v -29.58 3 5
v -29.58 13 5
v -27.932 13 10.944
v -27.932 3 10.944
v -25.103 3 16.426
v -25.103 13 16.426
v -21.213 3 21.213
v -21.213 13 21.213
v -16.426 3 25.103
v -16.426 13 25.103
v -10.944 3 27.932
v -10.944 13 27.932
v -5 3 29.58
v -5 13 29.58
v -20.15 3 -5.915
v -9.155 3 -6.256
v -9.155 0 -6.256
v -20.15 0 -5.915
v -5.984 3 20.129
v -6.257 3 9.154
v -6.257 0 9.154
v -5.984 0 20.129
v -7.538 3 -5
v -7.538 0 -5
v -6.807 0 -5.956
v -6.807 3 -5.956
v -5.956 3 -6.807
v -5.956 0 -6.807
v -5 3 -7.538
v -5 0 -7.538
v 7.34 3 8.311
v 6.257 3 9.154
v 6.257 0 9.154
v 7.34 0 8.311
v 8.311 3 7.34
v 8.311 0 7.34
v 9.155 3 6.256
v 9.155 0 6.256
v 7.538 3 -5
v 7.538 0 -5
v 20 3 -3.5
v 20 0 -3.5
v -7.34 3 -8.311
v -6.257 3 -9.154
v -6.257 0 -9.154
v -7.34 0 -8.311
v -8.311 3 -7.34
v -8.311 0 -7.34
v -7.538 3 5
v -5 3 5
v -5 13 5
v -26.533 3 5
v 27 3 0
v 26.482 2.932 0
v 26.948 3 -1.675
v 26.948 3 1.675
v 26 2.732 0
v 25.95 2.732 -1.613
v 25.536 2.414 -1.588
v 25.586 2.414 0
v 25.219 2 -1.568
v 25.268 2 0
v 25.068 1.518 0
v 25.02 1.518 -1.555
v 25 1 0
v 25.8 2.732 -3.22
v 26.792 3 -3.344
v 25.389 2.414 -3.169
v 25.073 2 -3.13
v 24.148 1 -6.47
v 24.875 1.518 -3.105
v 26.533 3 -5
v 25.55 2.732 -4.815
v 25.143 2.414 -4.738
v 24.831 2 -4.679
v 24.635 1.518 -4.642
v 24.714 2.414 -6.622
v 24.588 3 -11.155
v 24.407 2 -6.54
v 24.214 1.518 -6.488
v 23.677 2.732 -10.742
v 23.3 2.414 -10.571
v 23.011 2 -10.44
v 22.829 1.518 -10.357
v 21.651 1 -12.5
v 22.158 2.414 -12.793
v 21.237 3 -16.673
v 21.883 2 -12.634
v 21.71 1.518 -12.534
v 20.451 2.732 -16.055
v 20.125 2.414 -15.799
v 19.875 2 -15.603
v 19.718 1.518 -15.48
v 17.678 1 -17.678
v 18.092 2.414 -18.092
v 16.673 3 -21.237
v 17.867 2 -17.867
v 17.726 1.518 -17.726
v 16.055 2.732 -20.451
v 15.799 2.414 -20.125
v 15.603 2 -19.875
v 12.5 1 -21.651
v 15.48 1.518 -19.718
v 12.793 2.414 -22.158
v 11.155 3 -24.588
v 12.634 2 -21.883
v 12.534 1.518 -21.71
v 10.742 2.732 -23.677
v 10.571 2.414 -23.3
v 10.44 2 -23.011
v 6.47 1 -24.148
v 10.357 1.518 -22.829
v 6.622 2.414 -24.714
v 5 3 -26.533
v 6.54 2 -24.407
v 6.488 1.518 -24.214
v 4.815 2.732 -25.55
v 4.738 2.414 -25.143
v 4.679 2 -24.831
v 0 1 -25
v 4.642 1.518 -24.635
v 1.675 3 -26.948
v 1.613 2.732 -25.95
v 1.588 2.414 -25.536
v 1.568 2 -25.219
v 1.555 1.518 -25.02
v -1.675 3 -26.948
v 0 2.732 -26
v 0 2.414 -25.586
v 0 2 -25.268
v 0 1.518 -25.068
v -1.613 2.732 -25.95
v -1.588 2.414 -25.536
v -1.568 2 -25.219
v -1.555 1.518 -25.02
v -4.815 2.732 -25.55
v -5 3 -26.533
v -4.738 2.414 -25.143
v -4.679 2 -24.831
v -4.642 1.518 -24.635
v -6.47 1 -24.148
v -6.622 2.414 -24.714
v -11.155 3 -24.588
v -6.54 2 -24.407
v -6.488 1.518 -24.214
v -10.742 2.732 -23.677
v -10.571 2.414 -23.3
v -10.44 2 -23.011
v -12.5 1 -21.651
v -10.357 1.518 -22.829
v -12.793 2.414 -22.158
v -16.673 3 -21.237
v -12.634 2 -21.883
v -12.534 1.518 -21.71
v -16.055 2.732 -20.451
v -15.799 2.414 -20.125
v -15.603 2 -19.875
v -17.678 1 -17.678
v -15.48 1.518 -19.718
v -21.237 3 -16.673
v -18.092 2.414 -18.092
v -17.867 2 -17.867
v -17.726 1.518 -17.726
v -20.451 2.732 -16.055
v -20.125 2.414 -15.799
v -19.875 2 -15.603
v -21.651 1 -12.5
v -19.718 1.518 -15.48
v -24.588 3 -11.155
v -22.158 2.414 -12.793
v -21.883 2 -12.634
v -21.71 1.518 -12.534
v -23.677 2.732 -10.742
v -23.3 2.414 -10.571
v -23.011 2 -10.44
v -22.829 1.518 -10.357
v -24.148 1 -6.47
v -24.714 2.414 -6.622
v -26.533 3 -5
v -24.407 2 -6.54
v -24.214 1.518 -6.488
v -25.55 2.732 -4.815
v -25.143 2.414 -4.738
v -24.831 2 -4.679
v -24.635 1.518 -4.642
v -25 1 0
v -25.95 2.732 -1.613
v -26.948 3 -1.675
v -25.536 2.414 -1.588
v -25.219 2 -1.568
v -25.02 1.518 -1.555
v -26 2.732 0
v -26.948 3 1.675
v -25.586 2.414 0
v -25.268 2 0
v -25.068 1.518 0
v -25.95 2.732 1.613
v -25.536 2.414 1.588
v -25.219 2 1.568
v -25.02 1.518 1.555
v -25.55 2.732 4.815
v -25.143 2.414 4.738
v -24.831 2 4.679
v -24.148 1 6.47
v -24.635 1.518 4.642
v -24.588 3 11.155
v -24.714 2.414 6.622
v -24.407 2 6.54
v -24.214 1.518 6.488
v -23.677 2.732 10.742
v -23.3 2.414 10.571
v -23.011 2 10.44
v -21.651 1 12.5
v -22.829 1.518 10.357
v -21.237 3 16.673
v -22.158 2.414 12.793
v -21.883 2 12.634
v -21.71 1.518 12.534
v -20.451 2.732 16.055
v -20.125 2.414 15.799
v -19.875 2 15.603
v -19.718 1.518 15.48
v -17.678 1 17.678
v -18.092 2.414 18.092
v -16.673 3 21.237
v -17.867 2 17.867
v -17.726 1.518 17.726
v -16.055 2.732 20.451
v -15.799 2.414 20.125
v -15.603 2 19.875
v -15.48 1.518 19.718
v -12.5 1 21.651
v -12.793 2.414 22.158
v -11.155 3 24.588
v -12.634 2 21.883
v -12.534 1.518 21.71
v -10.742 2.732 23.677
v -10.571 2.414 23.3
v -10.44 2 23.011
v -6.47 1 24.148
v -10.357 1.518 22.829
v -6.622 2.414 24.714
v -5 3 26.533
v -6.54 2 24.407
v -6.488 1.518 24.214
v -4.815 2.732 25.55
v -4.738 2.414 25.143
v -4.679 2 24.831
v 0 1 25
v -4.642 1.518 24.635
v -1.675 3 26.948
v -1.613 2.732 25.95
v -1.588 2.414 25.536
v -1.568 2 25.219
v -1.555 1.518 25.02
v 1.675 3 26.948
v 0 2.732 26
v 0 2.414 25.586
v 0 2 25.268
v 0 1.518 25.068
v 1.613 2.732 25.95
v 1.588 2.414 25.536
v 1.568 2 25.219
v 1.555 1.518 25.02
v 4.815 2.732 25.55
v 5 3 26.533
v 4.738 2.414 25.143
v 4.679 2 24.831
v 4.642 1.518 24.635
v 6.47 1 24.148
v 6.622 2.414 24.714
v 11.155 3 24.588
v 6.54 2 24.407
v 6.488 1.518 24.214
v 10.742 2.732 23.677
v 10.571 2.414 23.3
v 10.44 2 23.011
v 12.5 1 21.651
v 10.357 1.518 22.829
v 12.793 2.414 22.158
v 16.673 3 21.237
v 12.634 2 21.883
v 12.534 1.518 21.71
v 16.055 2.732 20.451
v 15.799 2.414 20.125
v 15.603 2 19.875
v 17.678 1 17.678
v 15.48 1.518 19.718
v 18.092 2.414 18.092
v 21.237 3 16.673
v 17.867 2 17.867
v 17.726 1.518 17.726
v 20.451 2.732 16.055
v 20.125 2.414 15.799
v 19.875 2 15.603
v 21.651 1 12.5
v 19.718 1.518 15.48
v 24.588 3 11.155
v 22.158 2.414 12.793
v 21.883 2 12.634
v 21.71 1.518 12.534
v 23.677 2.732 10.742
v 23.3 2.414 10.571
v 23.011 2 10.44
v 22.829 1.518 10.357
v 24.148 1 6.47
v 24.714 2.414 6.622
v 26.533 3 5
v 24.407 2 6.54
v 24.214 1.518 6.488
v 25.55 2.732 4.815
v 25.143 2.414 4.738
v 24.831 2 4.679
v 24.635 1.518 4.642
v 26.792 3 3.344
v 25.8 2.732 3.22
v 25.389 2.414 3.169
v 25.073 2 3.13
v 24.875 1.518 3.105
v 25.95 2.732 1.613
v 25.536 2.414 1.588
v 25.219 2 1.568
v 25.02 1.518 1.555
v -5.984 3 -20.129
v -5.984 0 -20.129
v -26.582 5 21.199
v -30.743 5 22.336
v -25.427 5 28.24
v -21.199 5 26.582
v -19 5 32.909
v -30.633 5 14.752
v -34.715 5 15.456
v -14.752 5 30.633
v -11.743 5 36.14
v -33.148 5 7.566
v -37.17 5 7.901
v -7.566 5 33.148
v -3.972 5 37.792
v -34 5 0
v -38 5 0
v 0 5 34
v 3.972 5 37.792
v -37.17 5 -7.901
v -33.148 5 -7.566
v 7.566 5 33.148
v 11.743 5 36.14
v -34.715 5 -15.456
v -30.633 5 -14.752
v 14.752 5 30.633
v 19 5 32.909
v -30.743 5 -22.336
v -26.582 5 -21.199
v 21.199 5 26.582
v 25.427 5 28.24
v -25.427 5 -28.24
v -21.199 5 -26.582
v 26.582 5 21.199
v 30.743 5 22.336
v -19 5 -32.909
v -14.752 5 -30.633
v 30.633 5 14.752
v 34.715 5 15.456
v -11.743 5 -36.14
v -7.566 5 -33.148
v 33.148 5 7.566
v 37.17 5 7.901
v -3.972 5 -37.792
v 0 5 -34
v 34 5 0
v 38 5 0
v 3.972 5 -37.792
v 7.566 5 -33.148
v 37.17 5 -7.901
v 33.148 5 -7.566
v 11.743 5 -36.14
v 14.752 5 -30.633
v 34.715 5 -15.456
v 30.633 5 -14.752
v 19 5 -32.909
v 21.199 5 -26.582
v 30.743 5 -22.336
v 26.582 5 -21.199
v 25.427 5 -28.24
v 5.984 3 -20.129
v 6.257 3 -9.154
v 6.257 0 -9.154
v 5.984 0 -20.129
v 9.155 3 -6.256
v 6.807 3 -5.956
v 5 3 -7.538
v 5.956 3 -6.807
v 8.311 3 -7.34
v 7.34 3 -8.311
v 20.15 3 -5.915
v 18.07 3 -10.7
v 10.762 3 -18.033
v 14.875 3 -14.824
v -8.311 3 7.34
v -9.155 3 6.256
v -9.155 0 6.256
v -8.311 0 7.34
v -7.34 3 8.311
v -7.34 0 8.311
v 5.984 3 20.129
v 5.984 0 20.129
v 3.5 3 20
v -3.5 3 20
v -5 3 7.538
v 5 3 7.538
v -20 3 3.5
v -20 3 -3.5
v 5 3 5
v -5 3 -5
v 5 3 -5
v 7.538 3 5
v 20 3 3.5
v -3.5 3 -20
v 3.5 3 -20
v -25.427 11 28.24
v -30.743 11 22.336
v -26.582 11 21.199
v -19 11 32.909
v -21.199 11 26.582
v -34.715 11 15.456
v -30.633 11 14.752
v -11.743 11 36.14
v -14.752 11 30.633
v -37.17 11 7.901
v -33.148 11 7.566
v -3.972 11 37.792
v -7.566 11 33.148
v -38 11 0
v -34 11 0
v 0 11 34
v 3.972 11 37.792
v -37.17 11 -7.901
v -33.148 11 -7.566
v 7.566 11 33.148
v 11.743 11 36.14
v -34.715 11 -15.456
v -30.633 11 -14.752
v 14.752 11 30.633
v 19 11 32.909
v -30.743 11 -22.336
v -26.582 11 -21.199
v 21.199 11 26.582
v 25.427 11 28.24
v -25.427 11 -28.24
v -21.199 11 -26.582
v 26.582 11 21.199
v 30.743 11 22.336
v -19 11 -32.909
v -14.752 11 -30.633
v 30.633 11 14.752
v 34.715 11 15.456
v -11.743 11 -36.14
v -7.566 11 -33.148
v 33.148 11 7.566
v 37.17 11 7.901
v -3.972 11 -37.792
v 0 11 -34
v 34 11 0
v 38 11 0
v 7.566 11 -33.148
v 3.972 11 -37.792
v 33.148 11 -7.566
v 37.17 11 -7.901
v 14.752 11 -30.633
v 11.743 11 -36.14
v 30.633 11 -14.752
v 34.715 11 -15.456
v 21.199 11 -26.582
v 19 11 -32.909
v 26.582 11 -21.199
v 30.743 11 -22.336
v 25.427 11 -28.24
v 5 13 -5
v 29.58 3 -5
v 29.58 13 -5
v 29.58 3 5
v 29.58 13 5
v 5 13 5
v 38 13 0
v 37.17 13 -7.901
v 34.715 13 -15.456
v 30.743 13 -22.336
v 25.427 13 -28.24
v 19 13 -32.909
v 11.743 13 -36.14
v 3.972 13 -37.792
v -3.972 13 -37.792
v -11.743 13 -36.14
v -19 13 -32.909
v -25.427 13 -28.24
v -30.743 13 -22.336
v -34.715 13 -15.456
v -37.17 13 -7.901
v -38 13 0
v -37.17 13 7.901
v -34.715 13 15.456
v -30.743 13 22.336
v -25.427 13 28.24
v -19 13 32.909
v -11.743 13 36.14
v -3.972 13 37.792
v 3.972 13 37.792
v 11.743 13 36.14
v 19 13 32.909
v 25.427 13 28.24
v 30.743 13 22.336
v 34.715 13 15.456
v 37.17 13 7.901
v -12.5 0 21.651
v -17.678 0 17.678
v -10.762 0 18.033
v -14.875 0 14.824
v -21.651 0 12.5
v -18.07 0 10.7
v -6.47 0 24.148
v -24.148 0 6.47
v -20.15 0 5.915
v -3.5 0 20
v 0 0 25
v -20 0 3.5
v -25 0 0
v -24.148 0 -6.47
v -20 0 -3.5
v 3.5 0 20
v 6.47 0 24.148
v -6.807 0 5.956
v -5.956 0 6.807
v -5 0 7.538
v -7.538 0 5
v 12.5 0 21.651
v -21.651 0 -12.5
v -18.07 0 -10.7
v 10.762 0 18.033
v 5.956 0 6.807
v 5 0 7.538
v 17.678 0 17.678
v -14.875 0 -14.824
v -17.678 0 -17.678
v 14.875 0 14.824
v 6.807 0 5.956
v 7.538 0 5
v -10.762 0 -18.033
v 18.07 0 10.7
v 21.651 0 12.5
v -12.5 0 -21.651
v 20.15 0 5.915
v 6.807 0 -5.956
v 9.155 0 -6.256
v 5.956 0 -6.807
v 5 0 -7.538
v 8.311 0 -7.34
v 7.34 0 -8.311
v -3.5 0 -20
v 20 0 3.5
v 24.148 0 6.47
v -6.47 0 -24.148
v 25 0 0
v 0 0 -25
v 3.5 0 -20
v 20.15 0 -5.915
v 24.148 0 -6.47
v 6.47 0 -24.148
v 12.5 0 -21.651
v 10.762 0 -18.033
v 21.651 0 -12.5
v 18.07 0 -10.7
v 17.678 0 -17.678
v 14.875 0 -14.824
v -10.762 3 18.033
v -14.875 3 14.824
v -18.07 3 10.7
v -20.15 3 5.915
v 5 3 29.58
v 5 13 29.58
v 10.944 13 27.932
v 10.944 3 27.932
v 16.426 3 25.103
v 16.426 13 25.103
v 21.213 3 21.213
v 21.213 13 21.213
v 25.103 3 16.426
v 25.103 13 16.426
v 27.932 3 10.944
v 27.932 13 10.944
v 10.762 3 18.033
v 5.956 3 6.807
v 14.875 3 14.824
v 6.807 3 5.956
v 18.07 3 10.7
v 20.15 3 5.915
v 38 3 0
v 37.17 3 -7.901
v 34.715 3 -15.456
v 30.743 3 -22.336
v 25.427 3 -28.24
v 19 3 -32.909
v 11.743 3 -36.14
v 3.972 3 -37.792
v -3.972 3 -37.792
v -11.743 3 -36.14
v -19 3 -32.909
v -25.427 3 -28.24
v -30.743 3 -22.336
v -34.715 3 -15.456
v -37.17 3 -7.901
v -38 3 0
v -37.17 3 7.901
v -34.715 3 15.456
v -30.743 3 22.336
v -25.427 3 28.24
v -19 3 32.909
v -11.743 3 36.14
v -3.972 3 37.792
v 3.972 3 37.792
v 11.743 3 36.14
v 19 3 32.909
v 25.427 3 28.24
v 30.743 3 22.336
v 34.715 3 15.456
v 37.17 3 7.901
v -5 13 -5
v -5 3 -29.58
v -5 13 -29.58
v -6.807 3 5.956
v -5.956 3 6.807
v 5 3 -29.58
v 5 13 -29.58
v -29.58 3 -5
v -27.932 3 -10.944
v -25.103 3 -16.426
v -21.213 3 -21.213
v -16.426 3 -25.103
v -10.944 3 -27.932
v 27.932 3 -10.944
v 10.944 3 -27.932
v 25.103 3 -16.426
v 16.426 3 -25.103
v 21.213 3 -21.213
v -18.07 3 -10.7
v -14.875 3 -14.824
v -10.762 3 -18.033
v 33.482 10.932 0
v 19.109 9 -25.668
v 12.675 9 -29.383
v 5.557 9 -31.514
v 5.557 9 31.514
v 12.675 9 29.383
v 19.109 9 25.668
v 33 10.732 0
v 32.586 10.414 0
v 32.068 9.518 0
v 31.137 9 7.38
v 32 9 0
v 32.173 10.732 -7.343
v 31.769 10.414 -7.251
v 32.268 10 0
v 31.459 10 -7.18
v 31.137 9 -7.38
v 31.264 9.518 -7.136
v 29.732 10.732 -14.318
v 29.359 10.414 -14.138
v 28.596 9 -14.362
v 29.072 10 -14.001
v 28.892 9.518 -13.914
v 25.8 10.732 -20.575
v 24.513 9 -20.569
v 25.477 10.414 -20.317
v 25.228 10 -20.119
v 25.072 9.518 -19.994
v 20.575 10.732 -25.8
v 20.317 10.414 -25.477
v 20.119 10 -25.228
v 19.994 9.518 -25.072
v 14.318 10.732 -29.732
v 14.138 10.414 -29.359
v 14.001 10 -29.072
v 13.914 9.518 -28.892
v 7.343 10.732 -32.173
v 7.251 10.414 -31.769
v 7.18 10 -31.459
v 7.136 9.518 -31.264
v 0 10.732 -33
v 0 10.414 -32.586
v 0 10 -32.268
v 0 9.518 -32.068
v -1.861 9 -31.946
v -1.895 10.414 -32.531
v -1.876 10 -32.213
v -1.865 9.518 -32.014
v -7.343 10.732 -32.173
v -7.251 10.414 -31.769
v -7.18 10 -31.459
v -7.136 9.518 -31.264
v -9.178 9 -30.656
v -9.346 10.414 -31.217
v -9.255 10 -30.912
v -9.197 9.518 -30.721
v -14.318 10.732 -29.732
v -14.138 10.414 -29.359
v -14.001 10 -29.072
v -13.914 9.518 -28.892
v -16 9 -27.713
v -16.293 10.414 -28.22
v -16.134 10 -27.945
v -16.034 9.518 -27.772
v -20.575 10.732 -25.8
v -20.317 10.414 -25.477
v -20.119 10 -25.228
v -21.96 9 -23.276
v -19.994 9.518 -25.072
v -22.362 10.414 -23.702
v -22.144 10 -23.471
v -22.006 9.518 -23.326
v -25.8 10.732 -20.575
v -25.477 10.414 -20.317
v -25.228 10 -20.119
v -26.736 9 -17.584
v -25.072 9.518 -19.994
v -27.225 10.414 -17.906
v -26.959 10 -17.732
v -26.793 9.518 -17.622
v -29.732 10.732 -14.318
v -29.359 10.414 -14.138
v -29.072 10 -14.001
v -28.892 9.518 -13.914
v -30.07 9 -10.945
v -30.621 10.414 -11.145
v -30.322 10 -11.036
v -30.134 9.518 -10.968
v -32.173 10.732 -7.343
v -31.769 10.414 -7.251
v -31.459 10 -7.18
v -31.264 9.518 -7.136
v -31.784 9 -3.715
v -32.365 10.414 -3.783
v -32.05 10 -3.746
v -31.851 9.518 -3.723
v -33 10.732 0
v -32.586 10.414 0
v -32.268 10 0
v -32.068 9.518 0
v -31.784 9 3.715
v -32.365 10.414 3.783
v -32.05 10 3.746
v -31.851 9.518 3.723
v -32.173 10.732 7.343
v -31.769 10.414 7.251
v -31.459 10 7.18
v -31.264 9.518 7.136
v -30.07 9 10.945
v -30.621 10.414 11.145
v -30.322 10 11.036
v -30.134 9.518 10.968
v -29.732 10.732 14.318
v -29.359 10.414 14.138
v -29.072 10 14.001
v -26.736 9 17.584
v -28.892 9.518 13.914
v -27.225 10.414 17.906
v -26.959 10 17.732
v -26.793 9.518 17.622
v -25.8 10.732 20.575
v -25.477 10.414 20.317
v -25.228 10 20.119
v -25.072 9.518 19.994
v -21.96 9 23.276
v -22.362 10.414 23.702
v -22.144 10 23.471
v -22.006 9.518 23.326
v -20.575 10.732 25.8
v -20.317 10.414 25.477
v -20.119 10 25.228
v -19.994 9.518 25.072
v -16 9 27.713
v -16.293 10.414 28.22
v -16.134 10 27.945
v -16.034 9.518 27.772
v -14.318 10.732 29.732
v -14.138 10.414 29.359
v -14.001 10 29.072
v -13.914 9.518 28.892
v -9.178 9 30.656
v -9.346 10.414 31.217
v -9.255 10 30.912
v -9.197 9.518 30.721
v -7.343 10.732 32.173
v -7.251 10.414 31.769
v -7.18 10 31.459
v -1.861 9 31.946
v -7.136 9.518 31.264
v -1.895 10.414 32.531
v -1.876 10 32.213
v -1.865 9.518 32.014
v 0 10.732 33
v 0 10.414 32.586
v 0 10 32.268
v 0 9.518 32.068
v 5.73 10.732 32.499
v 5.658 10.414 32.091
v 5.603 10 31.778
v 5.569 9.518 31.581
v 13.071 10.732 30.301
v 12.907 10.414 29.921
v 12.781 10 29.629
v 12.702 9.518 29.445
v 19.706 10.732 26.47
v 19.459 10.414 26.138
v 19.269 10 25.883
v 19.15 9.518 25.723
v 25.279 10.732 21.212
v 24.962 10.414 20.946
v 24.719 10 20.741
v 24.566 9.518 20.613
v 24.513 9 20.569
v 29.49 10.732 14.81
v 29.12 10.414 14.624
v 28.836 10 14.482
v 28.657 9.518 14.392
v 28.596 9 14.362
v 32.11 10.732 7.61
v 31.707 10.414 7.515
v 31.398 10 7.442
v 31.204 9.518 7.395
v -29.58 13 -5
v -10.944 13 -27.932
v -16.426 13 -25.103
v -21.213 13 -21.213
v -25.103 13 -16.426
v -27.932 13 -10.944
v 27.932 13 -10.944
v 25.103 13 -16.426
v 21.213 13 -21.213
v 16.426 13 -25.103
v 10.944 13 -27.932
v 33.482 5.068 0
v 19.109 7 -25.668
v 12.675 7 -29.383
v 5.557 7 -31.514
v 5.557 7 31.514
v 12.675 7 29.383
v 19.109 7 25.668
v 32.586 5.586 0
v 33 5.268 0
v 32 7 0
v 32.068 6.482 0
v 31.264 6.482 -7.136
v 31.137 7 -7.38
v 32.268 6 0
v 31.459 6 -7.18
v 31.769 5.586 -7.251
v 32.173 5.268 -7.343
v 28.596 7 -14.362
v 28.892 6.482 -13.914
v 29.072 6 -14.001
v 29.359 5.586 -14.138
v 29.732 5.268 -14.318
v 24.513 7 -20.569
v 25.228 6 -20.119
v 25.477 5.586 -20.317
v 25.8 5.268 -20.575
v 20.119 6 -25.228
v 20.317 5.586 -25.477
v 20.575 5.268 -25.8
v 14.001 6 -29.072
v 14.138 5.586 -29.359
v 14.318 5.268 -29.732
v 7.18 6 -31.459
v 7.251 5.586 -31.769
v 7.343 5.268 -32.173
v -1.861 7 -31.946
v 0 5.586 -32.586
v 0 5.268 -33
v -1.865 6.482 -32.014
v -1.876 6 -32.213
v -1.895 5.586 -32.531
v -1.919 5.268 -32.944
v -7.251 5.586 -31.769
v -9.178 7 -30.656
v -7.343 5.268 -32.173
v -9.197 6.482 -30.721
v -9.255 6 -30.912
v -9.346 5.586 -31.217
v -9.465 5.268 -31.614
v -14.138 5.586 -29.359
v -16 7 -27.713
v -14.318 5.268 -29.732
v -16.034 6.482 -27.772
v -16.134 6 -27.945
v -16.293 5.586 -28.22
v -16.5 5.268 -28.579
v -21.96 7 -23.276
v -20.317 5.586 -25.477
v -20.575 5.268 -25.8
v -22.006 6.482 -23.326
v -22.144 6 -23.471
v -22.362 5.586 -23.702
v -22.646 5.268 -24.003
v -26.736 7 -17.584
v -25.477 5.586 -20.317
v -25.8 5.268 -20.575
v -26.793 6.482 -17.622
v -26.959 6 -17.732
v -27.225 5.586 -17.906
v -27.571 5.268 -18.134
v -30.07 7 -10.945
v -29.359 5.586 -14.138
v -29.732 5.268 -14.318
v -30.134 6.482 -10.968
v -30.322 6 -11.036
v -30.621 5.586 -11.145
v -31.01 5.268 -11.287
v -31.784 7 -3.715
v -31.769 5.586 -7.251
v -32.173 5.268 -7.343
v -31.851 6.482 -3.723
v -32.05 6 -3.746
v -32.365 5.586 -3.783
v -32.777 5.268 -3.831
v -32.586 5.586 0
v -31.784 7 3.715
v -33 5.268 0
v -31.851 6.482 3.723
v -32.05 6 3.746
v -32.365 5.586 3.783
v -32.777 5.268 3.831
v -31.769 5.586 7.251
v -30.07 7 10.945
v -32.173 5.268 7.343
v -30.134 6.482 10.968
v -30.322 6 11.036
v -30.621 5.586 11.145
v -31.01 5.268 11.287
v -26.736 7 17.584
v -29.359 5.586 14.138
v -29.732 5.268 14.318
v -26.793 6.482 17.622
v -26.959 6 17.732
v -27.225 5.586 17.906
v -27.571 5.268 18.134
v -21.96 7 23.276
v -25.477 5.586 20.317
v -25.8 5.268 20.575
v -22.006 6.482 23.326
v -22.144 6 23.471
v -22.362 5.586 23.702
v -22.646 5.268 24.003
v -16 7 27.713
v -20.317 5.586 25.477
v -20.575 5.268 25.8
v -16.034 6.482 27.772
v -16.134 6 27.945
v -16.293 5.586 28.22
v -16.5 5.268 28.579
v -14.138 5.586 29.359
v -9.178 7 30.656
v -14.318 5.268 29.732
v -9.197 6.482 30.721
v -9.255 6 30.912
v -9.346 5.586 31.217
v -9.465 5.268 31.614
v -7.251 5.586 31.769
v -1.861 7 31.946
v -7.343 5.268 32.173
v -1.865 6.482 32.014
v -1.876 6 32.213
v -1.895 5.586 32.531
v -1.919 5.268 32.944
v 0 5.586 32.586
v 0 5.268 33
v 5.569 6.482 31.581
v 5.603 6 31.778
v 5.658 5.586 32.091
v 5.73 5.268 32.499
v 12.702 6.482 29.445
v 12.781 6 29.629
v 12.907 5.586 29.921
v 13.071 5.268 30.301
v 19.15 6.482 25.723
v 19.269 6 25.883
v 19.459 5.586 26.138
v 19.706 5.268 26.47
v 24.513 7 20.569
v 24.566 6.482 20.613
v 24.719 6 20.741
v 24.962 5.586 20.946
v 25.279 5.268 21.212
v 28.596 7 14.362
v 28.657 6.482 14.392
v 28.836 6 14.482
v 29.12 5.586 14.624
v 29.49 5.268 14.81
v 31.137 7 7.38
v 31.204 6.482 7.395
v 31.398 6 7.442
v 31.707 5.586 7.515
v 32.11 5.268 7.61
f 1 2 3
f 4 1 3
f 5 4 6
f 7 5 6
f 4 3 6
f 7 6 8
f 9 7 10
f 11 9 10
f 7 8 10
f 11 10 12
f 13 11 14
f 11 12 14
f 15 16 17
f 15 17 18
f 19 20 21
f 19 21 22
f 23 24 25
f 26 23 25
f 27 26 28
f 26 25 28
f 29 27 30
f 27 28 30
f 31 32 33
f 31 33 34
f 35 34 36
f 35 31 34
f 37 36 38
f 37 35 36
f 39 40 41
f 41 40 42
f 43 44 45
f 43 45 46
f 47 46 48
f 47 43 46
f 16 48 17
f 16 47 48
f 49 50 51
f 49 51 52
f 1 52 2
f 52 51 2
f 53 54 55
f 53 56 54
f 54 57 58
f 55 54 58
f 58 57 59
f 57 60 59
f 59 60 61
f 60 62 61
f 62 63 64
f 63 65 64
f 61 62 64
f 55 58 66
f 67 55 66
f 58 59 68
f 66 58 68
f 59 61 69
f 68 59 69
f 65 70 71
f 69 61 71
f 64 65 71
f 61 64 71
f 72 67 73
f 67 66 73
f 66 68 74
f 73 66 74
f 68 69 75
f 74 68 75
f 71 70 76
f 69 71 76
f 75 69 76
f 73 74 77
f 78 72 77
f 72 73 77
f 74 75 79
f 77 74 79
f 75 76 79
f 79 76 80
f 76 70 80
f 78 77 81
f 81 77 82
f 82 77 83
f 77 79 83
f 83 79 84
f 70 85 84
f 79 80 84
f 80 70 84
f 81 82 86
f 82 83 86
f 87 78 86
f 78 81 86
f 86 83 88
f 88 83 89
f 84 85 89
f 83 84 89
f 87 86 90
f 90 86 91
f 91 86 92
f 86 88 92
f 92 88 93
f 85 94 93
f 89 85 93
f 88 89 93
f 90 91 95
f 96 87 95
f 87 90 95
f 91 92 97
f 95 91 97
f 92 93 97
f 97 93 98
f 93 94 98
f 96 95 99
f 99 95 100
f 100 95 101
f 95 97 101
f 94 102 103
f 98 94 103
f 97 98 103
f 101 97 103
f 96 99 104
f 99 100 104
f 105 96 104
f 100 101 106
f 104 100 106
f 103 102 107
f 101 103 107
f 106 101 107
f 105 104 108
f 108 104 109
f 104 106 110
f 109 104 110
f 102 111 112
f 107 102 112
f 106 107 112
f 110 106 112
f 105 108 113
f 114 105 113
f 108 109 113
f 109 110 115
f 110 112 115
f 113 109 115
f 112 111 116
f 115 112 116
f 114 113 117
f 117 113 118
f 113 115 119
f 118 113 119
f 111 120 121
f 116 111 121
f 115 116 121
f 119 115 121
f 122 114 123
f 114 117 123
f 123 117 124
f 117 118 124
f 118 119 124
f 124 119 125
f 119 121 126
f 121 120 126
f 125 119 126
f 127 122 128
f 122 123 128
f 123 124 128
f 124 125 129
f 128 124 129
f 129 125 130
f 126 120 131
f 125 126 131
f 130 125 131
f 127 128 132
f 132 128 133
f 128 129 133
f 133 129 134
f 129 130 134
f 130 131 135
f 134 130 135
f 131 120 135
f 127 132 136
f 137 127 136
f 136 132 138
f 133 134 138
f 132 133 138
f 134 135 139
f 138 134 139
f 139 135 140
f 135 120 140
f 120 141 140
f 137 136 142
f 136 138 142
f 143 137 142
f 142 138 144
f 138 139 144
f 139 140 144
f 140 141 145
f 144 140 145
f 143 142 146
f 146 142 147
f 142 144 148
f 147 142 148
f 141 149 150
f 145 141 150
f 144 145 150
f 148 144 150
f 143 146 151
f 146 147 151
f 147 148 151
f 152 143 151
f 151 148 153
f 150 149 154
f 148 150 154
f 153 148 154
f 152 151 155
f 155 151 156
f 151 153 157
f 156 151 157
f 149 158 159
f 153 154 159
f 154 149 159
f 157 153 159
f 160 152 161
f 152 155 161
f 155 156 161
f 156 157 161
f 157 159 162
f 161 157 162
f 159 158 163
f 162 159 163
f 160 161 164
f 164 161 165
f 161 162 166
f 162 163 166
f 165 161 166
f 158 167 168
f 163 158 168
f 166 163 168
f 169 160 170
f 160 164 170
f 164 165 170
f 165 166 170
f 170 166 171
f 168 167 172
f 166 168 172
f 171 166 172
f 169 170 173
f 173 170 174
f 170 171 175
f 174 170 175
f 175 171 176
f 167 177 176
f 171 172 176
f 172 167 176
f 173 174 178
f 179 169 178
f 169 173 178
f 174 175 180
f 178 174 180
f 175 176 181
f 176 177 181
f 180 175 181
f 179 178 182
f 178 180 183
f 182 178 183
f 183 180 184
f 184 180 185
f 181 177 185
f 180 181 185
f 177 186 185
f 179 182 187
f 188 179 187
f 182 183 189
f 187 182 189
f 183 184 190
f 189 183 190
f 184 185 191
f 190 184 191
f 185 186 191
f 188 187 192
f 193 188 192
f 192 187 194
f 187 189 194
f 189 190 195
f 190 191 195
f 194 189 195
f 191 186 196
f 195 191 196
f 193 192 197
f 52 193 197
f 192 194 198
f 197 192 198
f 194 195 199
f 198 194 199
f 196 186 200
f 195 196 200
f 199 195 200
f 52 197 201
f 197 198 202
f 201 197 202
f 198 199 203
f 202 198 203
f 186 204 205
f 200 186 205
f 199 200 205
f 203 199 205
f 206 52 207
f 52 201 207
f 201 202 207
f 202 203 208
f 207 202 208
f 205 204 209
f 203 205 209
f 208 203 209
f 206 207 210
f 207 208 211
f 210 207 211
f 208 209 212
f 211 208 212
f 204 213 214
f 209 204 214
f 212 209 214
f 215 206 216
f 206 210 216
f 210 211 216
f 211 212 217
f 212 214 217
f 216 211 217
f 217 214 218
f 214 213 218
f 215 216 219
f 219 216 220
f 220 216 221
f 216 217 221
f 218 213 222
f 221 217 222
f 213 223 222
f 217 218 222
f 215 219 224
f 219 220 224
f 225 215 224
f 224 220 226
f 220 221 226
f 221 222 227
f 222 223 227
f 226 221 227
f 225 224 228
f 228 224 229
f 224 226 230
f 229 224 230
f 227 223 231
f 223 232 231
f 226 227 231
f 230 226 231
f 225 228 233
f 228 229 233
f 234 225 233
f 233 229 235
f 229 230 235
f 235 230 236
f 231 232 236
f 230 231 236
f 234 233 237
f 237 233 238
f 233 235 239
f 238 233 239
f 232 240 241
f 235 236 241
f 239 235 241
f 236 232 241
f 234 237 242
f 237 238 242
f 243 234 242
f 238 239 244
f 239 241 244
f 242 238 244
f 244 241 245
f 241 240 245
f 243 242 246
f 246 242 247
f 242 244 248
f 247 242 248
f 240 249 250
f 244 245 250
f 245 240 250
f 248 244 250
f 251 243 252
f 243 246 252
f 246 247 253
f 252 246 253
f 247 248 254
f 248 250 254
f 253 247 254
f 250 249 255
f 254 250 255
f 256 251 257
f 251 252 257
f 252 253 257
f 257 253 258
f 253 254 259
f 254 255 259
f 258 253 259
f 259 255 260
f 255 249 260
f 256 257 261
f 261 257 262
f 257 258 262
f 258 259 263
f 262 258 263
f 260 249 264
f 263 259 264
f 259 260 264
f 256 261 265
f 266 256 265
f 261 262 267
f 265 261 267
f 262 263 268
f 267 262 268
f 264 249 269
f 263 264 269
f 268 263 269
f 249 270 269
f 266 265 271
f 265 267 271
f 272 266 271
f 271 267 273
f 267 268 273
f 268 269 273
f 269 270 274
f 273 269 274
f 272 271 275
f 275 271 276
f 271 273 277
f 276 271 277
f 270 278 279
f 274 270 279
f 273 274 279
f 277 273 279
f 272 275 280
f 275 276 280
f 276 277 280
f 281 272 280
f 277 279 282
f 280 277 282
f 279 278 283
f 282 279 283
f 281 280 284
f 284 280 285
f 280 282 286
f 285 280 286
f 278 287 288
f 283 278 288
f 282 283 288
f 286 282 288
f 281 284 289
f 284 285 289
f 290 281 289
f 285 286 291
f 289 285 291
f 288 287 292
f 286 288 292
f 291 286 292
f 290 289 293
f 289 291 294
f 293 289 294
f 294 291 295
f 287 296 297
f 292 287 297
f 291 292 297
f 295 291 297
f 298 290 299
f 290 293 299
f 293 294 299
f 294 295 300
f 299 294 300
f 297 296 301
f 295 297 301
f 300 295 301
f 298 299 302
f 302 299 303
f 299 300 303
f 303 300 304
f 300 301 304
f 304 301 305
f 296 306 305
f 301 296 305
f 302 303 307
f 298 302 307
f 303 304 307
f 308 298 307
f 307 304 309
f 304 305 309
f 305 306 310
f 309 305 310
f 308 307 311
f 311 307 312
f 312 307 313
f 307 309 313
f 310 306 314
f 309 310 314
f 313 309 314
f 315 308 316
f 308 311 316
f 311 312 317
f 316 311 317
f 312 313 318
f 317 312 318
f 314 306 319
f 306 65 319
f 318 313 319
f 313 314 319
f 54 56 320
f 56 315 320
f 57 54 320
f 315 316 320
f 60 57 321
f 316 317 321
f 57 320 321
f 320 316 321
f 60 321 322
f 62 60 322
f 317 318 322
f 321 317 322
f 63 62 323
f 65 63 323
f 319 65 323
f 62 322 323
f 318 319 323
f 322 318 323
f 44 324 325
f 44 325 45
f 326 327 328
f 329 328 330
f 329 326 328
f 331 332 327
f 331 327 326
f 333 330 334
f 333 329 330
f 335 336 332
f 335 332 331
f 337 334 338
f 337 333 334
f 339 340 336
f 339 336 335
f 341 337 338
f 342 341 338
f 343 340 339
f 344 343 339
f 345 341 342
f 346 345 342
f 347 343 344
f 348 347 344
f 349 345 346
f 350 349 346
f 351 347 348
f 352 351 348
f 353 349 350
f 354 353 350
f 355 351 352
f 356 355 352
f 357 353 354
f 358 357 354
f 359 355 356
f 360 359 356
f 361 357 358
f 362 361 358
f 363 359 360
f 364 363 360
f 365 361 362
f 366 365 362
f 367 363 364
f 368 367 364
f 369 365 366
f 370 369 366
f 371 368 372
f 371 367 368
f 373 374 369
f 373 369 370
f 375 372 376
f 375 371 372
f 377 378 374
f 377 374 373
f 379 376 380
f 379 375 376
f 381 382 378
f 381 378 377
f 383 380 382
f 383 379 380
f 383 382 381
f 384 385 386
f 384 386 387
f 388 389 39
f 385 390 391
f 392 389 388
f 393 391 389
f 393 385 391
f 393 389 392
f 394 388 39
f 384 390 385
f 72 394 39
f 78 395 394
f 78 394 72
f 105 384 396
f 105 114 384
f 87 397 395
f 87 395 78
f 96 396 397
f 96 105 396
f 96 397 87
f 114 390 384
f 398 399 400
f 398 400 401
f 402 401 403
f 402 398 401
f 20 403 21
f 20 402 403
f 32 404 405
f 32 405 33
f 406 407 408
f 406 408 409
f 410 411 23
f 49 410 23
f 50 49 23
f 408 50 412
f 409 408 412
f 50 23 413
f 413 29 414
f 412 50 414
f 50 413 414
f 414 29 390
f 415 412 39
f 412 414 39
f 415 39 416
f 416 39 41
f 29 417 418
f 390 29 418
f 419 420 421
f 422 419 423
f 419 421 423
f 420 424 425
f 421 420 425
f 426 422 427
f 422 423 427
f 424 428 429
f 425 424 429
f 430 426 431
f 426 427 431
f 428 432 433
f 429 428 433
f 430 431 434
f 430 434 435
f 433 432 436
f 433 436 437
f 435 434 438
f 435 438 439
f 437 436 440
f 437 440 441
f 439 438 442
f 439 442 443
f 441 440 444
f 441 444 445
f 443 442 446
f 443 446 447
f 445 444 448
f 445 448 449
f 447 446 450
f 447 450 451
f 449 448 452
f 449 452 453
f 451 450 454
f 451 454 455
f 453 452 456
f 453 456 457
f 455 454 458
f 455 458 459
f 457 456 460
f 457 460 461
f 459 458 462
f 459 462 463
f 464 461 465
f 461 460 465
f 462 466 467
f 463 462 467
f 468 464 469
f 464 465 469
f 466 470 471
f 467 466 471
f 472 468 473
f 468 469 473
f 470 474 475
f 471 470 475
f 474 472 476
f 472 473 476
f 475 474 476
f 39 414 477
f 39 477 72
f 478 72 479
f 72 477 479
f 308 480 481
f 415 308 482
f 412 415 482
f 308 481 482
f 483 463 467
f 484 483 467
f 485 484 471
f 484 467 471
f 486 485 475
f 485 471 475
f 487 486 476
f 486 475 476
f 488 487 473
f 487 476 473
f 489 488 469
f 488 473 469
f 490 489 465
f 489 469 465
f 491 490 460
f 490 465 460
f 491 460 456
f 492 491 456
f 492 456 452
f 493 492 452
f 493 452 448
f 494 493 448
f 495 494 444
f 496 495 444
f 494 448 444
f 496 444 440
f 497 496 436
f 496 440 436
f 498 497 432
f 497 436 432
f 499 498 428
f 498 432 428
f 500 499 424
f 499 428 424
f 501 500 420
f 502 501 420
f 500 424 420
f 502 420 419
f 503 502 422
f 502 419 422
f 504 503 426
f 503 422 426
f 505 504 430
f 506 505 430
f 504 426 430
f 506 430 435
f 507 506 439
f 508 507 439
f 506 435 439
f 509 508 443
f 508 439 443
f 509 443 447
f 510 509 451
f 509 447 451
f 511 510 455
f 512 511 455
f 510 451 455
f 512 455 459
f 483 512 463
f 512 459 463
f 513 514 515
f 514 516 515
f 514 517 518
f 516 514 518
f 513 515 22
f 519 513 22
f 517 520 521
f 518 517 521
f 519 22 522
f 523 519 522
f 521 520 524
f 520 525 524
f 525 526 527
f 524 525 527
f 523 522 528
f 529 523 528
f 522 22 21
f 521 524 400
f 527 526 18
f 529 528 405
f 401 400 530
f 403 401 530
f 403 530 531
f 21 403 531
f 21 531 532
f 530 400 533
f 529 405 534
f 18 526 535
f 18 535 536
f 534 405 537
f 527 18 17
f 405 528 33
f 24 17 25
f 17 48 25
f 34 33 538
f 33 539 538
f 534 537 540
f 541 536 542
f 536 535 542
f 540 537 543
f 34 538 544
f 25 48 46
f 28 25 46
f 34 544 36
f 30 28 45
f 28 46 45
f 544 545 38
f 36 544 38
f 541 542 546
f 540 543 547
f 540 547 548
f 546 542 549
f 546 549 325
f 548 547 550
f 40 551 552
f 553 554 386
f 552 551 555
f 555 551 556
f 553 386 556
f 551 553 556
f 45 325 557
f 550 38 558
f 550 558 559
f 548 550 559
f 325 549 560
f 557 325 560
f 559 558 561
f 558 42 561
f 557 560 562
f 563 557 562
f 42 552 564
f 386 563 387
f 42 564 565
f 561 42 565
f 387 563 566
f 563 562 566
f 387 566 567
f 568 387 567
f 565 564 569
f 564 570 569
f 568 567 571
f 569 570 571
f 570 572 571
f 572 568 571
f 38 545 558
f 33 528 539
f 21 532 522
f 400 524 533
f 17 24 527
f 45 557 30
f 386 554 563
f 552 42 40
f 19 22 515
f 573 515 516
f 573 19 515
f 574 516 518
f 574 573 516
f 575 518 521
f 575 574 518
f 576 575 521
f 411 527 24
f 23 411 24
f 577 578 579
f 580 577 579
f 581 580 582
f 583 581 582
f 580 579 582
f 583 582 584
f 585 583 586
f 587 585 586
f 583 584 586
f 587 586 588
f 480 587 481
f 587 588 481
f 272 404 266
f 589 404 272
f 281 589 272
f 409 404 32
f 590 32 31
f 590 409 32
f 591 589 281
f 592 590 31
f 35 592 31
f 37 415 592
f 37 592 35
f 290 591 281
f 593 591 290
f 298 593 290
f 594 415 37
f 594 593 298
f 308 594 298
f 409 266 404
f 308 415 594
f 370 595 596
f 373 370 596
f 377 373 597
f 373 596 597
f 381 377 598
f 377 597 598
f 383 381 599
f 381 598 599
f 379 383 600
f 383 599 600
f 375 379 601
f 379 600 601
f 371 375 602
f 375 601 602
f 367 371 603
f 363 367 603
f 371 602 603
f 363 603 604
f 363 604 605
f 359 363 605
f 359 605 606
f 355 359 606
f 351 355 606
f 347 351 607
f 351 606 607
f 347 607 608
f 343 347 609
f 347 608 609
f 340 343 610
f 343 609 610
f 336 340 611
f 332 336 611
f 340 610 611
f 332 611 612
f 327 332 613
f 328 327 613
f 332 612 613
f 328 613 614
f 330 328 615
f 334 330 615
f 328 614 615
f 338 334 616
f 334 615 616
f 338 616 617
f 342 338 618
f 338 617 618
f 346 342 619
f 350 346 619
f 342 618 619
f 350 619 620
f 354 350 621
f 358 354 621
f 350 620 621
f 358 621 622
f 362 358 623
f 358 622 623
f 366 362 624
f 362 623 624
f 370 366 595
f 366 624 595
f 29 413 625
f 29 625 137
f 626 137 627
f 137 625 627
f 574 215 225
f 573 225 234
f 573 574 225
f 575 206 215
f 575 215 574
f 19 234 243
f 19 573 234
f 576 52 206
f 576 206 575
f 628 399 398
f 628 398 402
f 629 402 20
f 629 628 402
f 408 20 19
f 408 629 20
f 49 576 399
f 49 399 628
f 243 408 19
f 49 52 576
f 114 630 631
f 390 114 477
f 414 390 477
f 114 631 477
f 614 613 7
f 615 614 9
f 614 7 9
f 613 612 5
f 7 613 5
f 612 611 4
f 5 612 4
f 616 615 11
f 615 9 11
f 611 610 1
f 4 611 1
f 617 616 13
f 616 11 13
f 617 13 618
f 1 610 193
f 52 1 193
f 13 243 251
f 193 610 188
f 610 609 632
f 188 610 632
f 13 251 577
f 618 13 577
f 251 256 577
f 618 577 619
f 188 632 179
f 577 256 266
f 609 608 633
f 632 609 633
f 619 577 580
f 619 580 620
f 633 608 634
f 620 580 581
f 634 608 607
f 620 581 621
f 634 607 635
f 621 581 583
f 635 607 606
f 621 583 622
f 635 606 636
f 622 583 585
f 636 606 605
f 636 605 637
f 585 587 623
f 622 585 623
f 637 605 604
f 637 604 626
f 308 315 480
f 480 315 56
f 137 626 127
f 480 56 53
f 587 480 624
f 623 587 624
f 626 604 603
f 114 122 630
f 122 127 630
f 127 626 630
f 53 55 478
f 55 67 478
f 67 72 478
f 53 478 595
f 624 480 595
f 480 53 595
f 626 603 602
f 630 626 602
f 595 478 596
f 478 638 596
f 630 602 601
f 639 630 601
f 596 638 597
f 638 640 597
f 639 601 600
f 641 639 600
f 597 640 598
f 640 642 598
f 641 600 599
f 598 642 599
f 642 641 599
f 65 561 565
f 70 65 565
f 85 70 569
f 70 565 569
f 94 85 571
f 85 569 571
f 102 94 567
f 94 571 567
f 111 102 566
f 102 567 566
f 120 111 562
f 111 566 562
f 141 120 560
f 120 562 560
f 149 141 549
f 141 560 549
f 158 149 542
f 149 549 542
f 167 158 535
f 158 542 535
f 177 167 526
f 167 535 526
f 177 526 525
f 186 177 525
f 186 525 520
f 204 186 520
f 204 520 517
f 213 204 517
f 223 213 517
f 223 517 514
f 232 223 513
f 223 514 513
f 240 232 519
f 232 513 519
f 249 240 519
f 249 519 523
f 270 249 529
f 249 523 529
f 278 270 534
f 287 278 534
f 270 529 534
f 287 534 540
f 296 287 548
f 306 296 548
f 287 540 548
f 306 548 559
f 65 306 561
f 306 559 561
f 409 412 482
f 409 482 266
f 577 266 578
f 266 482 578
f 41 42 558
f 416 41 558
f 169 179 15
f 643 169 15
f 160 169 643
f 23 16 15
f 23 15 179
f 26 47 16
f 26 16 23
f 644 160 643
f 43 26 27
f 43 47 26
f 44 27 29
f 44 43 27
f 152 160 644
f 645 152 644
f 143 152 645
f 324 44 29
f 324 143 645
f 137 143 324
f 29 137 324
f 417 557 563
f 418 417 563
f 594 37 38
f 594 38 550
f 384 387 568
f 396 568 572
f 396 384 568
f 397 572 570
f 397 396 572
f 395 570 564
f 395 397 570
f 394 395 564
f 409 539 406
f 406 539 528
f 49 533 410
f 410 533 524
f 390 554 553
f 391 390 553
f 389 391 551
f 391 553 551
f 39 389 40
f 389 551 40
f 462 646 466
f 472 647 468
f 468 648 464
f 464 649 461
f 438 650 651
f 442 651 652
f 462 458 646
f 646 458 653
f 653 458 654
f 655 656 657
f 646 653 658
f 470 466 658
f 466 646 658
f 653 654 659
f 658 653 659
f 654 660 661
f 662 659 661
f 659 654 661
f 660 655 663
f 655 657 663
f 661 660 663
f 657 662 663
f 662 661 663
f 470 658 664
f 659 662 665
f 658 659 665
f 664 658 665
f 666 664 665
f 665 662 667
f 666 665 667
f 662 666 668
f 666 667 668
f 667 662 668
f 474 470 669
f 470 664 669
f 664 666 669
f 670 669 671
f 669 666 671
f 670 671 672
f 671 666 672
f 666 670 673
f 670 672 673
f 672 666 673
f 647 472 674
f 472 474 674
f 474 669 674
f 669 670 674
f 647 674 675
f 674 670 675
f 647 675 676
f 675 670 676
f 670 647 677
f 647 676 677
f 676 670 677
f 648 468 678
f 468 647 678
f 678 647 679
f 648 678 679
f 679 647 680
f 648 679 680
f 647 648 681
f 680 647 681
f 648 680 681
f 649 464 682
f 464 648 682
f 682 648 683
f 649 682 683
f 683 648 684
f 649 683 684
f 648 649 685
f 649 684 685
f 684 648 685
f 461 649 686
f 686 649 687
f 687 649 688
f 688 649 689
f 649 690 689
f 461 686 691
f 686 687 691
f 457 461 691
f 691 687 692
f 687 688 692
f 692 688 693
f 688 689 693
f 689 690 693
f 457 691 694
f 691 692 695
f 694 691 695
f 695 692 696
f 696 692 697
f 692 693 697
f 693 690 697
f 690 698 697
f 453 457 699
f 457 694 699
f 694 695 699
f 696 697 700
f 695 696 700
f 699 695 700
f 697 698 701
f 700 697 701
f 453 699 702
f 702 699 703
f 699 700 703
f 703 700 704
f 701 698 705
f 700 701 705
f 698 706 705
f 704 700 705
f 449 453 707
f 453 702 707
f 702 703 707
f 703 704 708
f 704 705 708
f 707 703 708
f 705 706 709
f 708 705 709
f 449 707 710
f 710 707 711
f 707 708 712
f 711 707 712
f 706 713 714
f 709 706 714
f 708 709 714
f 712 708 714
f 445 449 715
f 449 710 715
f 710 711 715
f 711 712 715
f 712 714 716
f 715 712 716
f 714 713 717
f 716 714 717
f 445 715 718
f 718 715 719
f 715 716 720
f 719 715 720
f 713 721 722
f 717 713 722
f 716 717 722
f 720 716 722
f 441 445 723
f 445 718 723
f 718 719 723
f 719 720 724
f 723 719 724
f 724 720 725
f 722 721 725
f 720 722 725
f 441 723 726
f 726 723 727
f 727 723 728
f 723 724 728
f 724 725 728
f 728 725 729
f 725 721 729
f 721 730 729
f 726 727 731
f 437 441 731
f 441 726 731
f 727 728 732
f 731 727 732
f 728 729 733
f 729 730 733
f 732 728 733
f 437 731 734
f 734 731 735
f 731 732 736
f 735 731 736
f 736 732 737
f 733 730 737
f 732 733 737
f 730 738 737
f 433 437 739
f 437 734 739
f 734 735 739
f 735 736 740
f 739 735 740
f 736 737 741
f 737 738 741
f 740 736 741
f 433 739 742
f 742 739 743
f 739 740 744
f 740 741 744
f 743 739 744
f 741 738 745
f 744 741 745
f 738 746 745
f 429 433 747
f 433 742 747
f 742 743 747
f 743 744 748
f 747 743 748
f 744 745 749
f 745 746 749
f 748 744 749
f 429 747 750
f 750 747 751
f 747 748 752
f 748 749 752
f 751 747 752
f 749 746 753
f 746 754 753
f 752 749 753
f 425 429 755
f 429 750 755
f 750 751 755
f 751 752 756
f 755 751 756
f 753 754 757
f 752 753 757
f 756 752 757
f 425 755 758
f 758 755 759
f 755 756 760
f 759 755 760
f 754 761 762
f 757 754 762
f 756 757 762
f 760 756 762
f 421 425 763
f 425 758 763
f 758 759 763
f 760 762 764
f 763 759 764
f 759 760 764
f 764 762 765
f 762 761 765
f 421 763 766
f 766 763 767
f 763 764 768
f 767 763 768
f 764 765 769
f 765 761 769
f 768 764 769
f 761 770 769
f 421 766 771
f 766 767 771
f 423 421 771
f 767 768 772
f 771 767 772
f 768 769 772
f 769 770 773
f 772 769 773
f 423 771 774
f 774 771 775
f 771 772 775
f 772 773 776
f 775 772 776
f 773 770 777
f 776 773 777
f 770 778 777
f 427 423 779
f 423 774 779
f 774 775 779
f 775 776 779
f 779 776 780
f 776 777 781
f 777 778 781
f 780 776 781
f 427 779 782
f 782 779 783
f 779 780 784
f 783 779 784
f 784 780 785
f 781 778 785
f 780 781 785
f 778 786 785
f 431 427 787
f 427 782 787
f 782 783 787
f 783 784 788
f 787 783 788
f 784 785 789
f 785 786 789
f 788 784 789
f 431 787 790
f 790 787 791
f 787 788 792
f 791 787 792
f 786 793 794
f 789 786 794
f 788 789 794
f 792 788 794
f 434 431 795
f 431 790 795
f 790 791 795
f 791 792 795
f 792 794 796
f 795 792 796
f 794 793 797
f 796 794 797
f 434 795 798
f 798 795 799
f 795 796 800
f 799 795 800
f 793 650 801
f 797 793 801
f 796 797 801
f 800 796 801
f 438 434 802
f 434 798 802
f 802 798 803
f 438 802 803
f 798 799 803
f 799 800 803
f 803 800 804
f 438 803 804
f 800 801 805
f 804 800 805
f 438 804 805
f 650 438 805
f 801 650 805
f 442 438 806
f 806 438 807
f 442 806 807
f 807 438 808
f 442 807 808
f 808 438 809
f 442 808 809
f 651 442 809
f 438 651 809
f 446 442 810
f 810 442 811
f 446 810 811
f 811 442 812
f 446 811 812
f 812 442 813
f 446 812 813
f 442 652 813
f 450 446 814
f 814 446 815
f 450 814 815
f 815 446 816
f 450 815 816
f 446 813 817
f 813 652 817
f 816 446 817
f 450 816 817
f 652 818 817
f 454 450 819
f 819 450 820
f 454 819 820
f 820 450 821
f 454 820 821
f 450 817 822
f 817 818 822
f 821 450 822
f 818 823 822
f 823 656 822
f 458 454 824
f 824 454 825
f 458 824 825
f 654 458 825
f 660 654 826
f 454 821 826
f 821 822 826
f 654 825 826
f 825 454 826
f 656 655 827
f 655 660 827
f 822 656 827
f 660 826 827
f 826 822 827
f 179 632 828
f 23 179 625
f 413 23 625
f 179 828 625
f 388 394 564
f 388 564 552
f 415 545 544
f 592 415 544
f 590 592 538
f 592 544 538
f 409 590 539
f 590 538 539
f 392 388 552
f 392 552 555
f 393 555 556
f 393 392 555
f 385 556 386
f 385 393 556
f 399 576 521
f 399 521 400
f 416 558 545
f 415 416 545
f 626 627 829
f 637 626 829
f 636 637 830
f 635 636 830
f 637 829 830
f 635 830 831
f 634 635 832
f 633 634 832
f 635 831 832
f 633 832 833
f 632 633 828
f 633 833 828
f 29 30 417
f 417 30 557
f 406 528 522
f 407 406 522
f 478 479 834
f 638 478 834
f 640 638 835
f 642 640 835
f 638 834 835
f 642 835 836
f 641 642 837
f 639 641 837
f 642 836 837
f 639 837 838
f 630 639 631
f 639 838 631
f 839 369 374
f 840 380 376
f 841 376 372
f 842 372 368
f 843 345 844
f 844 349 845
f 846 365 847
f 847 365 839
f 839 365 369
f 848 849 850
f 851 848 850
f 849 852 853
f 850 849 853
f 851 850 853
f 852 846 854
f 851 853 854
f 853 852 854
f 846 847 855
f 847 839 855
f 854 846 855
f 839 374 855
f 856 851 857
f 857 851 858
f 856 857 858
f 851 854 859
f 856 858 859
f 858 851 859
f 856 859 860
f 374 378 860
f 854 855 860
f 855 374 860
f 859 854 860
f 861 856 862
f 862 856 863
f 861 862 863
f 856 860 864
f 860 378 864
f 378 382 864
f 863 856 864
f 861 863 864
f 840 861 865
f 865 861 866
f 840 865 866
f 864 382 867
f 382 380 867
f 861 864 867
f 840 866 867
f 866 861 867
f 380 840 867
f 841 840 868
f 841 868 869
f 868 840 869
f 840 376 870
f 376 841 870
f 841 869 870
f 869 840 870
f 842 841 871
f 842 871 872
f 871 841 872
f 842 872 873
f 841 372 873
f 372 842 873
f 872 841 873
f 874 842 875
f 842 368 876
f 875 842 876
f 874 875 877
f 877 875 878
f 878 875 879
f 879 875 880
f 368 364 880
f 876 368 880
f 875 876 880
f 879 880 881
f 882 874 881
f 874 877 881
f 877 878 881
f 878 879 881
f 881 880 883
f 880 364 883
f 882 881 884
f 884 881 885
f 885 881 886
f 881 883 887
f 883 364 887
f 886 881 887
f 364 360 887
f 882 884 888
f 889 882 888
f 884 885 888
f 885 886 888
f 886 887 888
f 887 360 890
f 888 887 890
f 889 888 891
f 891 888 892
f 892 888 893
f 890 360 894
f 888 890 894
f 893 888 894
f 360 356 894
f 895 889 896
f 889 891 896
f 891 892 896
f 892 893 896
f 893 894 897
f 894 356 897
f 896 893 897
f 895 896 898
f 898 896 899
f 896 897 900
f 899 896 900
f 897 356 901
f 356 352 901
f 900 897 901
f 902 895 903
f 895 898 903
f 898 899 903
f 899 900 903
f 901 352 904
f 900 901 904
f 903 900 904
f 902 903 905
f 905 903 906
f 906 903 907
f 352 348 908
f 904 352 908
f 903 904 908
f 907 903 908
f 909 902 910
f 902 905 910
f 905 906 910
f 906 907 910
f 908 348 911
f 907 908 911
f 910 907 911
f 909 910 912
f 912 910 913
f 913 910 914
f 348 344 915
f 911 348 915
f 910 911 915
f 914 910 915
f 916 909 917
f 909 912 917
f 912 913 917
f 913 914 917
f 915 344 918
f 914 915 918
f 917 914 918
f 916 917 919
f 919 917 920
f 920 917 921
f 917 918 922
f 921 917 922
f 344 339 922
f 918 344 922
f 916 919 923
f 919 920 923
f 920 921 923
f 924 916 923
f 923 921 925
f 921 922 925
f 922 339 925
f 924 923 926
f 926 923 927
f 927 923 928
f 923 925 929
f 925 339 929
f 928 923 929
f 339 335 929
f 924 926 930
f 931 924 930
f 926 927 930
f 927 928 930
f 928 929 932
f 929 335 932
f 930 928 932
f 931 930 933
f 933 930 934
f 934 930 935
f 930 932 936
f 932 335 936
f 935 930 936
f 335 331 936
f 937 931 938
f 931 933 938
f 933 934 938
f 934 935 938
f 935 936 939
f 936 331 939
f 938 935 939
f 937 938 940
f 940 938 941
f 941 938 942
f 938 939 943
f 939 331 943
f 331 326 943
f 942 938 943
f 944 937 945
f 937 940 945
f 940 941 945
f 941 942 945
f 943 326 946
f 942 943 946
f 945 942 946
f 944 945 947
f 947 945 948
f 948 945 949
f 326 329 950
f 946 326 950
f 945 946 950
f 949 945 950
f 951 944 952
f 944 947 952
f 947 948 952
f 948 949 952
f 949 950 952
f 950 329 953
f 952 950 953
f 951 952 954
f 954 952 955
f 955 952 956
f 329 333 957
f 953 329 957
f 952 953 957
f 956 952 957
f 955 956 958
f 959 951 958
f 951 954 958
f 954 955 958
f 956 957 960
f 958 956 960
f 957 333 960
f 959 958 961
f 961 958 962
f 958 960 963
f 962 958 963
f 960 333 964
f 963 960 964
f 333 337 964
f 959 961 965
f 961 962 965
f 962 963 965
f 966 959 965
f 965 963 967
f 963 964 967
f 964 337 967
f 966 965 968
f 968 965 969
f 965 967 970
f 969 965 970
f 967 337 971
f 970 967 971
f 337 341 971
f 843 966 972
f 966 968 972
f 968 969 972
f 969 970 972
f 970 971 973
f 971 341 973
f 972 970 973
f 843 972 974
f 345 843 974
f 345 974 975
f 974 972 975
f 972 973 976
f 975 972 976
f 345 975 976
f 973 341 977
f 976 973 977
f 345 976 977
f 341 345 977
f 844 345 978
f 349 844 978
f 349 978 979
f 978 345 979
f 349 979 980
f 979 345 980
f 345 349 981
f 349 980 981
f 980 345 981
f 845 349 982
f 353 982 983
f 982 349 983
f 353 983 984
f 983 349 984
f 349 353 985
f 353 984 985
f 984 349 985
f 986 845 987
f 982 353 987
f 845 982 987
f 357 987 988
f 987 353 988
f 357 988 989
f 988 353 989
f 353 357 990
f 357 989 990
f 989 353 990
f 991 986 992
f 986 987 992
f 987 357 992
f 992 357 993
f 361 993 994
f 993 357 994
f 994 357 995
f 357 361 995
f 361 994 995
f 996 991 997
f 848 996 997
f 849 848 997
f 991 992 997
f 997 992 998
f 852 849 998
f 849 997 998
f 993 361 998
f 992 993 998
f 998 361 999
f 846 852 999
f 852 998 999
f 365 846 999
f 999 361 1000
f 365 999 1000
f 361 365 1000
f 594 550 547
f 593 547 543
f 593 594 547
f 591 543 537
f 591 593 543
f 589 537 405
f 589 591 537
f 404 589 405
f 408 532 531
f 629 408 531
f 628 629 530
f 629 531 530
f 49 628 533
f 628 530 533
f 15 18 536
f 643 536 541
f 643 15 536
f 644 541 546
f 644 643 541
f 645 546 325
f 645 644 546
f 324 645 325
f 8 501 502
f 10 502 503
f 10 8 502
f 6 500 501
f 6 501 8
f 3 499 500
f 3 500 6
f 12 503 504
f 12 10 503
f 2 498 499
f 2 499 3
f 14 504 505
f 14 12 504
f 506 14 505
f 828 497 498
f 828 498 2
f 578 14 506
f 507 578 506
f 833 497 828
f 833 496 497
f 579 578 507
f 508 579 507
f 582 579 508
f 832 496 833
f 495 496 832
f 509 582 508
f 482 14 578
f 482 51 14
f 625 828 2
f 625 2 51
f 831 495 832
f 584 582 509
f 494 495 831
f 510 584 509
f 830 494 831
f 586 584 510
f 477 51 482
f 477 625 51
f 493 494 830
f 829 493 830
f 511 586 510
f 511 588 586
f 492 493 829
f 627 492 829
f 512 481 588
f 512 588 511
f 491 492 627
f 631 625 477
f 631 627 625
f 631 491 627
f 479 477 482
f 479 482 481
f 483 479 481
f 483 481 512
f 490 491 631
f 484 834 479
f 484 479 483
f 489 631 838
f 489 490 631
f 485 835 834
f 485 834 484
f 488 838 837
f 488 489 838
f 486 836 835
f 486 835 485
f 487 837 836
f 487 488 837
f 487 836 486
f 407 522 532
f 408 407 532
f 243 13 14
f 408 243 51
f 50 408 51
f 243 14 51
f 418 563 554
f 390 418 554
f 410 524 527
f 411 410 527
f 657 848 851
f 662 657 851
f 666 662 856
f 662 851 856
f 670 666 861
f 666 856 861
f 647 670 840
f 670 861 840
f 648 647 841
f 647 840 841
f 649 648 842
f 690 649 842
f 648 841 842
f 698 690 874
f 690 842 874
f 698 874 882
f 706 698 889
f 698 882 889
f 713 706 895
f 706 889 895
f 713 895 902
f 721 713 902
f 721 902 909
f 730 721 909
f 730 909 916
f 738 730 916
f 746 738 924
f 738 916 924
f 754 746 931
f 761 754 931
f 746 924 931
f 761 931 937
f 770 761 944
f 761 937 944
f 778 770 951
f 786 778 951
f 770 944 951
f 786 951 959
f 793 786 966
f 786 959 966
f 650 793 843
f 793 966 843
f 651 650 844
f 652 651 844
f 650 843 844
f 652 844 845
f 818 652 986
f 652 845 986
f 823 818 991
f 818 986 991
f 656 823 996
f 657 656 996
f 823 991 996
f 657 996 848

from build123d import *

# Parameters (mm, degrees)
SKETCH1_R            = 25
BOSS_EXTRUDE2_DEPTH  = 3
SKETCH3_R            = 38
BOSS_EXTRUDE4_DEPTH  = 2
SKETCH5_R            = 32
SKETCH5_R_2          = 27
BOSS_EXTRUDE5_DEPTH  = 6
SKETCH6_R            = 5
BOSS_EXTRUDE7_DEPTH  = 6
SKETCH7_R            = 38
BOSS_EXTRUDE9_DEPTH  = 2
FILLET2_R            = 2
FILLET3_R            = 2
FILLET5_R            = 2
SKETCH8_R            = 30
BOSS_EXTRUDE10_DEPTH = 9
CUT_EXTRUDE1_DEPTH   = 10
CUT_EXTRUDE3_DEPTH   = 10


with BuildPart() as part:
    # Sketch1 → Boss-Extrude2 (new body)
    with BuildSketch(Plane(origin=(0, 0, 0), x_dir=(1, 0, 0), z_dir=(0, 1, 0))):
        Circle(SKETCH1_R)
        with BuildLine():
            Line((20, -3.5), (7.537849637, -5))
            ThreePointArc((7.537849637, -5), (6.396060395, -6.396060395), (5, -7.537849637))
            Line((5, -7.537849637), (3.5, -20))
            Line((3.5, -20), (-3.5, -20))
            Line((-3.5, -20), (-5, -7.537849637))
            ThreePointArc((-5, -7.537849637), (-6.396060395, -6.396060395), (-7.537849637, -5))
            Line((-7.537849637, -5), (-20, -3.5))
            Line((-20, -3.5), (-20, 3.5))
            Line((-20, 3.5), (-7.537849637, 5))
            ThreePointArc((-7.537849637, 5), (-6.396060395, 6.396060395), (-5, 7.537849637))
            Line((-5, 7.537849637), (-3.5, 20))
            Line((-3.5, 20), (3.5, 20))
            Line((3.5, 20), (5, 7.537849637))
            ThreePointArc((5, 7.537849637), (6.396060395, 6.396060395), (7.537849637, 5))
            Line((7.537849637, 5), (20, 3.5))
            Line((20, 3.5), (20, -3.5))
        make_face(mode=Mode.SUBTRACT)
    extrude(amount=BOSS_EXTRUDE2_DEPTH)

    # Sketch3 → Boss-Extrude4 (add)
    with BuildSketch(Plane(origin=(0, 3, 0), x_dir=(1, 0, 0), z_dir=(0, 1, 0))):
        Circle(SKETCH3_R)
    extrude(amount=BOSS_EXTRUDE4_DEPTH)

    # Sketch5 → Boss-Extrude5 (add)
    with BuildSketch(Plane(origin=(0, 5, 0), x_dir=(1, 0, 0), z_dir=(0, 1, 0))):
        Circle(SKETCH5_R)
        Circle(SKETCH5_R_2, mode=Mode.SUBTRACT)
    extrude(amount=BOSS_EXTRUDE5_DEPTH)

    # Sketch6 → Boss-Extrude7 (add)
    with BuildSketch(Plane(origin=(0, 5, 0), x_dir=(1, 0, 0), z_dir=(0, 1, 0))):
        Circle(SKETCH6_R)
    extrude(amount=BOSS_EXTRUDE7_DEPTH)

    # Sketch7 → Boss-Extrude9 (add)
    with BuildSketch(Plane(origin=(0, 11, 0), x_dir=(1, 0, 0), z_dir=(0, 1, 0))):
        Circle(SKETCH7_R)
    extrude(amount=BOSS_EXTRUDE9_DEPTH)

    # Fillet2
    fillet2_edges = [part.edges().sort_by_distance(p)[0] for p in [
        (-32, 11, 0),
    ]]
    fillet(fillet2_edges, radius=FILLET2_R)

    # Fillet3
    fillet3_edges = [part.edges().sort_by_distance(p)[0] for p in [
        (-32, 5, 0),
    ]]
    fillet(fillet3_edges, radius=FILLET3_R)

    # Fillet5
    fillet5_edges = [part.edges().sort_by_distance(p)[0] for p in [
        (-25, 3, 0),
    ]]
    fillet(fillet5_edges, radius=FILLET5_R)

    # Sketch8 → Boss-Extrude10 (add)
    with BuildSketch(Plane(origin=(0, 13, 0), x_dir=(1, 0, 0), z_dir=(0, 1, 0))):
        Circle(SKETCH8_R)
    extrude(amount=-BOSS_EXTRUDE10_DEPTH)

    # Sketch9 → Cut-Extrude1 (cut)
    with BuildSketch(Plane(origin=(0, 13, 0), x_dir=(1, 0, 0), z_dir=(0, 1, 0))):
        with BuildLine():
            Line((5, -5), (5, -29.580398915))
            ThreePointArc((5, -29.580398915), (21.213203436, -21.213203436), (29.580398915, -5))
            Line((29.580398915, -5), (5, -5))
        make_face()
        with BuildLine():
            Line((-5, -29.580398915), (-5, -5))
            Line((-5, -5), (-29.580398915, -5))
            ThreePointArc((-29.580398915, -5), (-21.213203436, -21.213203436), (-5, -29.580398915))
        make_face()
        with BuildLine():
            Line((-29.580398915, 5), (-5, 5))
            Line((-5, 5), (-5, 29.580398915))
            ThreePointArc((-5, 29.580398915), (-21.213203436, 21.213203436), (-29.580398915, 5))
        make_face()
        with BuildLine():
            ThreePointArc((29.580398915, 5), (21.213203436, 21.213203436), (5, 29.580398915))
            Line((5, 29.580398915), (5, 5))
            Line((5, 5), (29.580398915, 5))
        make_face()
    extrude(amount=-CUT_EXTRUDE1_DEPTH, mode=Mode.SUBTRACT)

    # Sketch10 → Cut-Extrude3 (cut)
    with BuildSketch(Plane(origin=(0, 3, 0), x_dir=(-1, 0, 0), z_dir=(0, -1, 0))):
        with BuildLine():
            ThreePointArc((-9.154882095, 6.256063873), (-7.840900748, 7.840311015), (-6.256752441, 9.154411518))
            Line((-6.256752441, 9.154411518), (-5.984311052, 20.129282681))
            ThreePointArc((-5.984311052, 20.129282681), (-14.874716269, 14.823724765), (-20.149713772, 5.915152991))
            Line((-20.149713772, 5.915152991), (-9.154882095, 6.256063873))
        make_face()
        with BuildLine():
            Line((5.984311052, 20.129282681), (6.256752441, 9.154411518))
            ThreePointArc((6.256752441, 9.154411518), (7.840900748, 7.840311015), (9.154882095, 6.256063873))
            Line((9.154882095, 6.256063873), (20.149713772, 5.915152991))
            ThreePointArc((20.149713772, 5.915152991), (14.874716269, 14.823724765), (5.984311052, 20.129282681))
        make_face()
        with BuildLine():
            Line((20.149713772, -5.915152991), (9.154882095, -6.256063873))
            ThreePointArc((9.154882095, -6.256063873), (7.840900748, -7.840311015), (6.256752441, -9.154411518))
            Line((6.256752441, -9.154411518), (5.984311052, -20.129282681))
            ThreePointArc((5.984311052, -20.129282681), (14.874716269, -14.823724765), (20.149713772, -5.915152991))
        make_face()
        with BuildLine():
            ThreePointArc((-6.256752441, -9.154411518), (-7.840900748, -7.840311015), (-9.154882095, -6.256063873))
            Line((-9.154882095, -6.256063873), (-20.149713772, -5.915152991))
            ThreePointArc((-20.149713772, -5.915152991), (-14.874716269, -14.823724765), (-5.984311052, -20.129282681))
            Line((-5.984311052, -20.129282681), (-6.256752441, -9.154411518))
        make_face()
    extrude(amount=CUT_EXTRUDE3_DEPTH, mode=Mode.SUBTRACT)


solid = part.part
